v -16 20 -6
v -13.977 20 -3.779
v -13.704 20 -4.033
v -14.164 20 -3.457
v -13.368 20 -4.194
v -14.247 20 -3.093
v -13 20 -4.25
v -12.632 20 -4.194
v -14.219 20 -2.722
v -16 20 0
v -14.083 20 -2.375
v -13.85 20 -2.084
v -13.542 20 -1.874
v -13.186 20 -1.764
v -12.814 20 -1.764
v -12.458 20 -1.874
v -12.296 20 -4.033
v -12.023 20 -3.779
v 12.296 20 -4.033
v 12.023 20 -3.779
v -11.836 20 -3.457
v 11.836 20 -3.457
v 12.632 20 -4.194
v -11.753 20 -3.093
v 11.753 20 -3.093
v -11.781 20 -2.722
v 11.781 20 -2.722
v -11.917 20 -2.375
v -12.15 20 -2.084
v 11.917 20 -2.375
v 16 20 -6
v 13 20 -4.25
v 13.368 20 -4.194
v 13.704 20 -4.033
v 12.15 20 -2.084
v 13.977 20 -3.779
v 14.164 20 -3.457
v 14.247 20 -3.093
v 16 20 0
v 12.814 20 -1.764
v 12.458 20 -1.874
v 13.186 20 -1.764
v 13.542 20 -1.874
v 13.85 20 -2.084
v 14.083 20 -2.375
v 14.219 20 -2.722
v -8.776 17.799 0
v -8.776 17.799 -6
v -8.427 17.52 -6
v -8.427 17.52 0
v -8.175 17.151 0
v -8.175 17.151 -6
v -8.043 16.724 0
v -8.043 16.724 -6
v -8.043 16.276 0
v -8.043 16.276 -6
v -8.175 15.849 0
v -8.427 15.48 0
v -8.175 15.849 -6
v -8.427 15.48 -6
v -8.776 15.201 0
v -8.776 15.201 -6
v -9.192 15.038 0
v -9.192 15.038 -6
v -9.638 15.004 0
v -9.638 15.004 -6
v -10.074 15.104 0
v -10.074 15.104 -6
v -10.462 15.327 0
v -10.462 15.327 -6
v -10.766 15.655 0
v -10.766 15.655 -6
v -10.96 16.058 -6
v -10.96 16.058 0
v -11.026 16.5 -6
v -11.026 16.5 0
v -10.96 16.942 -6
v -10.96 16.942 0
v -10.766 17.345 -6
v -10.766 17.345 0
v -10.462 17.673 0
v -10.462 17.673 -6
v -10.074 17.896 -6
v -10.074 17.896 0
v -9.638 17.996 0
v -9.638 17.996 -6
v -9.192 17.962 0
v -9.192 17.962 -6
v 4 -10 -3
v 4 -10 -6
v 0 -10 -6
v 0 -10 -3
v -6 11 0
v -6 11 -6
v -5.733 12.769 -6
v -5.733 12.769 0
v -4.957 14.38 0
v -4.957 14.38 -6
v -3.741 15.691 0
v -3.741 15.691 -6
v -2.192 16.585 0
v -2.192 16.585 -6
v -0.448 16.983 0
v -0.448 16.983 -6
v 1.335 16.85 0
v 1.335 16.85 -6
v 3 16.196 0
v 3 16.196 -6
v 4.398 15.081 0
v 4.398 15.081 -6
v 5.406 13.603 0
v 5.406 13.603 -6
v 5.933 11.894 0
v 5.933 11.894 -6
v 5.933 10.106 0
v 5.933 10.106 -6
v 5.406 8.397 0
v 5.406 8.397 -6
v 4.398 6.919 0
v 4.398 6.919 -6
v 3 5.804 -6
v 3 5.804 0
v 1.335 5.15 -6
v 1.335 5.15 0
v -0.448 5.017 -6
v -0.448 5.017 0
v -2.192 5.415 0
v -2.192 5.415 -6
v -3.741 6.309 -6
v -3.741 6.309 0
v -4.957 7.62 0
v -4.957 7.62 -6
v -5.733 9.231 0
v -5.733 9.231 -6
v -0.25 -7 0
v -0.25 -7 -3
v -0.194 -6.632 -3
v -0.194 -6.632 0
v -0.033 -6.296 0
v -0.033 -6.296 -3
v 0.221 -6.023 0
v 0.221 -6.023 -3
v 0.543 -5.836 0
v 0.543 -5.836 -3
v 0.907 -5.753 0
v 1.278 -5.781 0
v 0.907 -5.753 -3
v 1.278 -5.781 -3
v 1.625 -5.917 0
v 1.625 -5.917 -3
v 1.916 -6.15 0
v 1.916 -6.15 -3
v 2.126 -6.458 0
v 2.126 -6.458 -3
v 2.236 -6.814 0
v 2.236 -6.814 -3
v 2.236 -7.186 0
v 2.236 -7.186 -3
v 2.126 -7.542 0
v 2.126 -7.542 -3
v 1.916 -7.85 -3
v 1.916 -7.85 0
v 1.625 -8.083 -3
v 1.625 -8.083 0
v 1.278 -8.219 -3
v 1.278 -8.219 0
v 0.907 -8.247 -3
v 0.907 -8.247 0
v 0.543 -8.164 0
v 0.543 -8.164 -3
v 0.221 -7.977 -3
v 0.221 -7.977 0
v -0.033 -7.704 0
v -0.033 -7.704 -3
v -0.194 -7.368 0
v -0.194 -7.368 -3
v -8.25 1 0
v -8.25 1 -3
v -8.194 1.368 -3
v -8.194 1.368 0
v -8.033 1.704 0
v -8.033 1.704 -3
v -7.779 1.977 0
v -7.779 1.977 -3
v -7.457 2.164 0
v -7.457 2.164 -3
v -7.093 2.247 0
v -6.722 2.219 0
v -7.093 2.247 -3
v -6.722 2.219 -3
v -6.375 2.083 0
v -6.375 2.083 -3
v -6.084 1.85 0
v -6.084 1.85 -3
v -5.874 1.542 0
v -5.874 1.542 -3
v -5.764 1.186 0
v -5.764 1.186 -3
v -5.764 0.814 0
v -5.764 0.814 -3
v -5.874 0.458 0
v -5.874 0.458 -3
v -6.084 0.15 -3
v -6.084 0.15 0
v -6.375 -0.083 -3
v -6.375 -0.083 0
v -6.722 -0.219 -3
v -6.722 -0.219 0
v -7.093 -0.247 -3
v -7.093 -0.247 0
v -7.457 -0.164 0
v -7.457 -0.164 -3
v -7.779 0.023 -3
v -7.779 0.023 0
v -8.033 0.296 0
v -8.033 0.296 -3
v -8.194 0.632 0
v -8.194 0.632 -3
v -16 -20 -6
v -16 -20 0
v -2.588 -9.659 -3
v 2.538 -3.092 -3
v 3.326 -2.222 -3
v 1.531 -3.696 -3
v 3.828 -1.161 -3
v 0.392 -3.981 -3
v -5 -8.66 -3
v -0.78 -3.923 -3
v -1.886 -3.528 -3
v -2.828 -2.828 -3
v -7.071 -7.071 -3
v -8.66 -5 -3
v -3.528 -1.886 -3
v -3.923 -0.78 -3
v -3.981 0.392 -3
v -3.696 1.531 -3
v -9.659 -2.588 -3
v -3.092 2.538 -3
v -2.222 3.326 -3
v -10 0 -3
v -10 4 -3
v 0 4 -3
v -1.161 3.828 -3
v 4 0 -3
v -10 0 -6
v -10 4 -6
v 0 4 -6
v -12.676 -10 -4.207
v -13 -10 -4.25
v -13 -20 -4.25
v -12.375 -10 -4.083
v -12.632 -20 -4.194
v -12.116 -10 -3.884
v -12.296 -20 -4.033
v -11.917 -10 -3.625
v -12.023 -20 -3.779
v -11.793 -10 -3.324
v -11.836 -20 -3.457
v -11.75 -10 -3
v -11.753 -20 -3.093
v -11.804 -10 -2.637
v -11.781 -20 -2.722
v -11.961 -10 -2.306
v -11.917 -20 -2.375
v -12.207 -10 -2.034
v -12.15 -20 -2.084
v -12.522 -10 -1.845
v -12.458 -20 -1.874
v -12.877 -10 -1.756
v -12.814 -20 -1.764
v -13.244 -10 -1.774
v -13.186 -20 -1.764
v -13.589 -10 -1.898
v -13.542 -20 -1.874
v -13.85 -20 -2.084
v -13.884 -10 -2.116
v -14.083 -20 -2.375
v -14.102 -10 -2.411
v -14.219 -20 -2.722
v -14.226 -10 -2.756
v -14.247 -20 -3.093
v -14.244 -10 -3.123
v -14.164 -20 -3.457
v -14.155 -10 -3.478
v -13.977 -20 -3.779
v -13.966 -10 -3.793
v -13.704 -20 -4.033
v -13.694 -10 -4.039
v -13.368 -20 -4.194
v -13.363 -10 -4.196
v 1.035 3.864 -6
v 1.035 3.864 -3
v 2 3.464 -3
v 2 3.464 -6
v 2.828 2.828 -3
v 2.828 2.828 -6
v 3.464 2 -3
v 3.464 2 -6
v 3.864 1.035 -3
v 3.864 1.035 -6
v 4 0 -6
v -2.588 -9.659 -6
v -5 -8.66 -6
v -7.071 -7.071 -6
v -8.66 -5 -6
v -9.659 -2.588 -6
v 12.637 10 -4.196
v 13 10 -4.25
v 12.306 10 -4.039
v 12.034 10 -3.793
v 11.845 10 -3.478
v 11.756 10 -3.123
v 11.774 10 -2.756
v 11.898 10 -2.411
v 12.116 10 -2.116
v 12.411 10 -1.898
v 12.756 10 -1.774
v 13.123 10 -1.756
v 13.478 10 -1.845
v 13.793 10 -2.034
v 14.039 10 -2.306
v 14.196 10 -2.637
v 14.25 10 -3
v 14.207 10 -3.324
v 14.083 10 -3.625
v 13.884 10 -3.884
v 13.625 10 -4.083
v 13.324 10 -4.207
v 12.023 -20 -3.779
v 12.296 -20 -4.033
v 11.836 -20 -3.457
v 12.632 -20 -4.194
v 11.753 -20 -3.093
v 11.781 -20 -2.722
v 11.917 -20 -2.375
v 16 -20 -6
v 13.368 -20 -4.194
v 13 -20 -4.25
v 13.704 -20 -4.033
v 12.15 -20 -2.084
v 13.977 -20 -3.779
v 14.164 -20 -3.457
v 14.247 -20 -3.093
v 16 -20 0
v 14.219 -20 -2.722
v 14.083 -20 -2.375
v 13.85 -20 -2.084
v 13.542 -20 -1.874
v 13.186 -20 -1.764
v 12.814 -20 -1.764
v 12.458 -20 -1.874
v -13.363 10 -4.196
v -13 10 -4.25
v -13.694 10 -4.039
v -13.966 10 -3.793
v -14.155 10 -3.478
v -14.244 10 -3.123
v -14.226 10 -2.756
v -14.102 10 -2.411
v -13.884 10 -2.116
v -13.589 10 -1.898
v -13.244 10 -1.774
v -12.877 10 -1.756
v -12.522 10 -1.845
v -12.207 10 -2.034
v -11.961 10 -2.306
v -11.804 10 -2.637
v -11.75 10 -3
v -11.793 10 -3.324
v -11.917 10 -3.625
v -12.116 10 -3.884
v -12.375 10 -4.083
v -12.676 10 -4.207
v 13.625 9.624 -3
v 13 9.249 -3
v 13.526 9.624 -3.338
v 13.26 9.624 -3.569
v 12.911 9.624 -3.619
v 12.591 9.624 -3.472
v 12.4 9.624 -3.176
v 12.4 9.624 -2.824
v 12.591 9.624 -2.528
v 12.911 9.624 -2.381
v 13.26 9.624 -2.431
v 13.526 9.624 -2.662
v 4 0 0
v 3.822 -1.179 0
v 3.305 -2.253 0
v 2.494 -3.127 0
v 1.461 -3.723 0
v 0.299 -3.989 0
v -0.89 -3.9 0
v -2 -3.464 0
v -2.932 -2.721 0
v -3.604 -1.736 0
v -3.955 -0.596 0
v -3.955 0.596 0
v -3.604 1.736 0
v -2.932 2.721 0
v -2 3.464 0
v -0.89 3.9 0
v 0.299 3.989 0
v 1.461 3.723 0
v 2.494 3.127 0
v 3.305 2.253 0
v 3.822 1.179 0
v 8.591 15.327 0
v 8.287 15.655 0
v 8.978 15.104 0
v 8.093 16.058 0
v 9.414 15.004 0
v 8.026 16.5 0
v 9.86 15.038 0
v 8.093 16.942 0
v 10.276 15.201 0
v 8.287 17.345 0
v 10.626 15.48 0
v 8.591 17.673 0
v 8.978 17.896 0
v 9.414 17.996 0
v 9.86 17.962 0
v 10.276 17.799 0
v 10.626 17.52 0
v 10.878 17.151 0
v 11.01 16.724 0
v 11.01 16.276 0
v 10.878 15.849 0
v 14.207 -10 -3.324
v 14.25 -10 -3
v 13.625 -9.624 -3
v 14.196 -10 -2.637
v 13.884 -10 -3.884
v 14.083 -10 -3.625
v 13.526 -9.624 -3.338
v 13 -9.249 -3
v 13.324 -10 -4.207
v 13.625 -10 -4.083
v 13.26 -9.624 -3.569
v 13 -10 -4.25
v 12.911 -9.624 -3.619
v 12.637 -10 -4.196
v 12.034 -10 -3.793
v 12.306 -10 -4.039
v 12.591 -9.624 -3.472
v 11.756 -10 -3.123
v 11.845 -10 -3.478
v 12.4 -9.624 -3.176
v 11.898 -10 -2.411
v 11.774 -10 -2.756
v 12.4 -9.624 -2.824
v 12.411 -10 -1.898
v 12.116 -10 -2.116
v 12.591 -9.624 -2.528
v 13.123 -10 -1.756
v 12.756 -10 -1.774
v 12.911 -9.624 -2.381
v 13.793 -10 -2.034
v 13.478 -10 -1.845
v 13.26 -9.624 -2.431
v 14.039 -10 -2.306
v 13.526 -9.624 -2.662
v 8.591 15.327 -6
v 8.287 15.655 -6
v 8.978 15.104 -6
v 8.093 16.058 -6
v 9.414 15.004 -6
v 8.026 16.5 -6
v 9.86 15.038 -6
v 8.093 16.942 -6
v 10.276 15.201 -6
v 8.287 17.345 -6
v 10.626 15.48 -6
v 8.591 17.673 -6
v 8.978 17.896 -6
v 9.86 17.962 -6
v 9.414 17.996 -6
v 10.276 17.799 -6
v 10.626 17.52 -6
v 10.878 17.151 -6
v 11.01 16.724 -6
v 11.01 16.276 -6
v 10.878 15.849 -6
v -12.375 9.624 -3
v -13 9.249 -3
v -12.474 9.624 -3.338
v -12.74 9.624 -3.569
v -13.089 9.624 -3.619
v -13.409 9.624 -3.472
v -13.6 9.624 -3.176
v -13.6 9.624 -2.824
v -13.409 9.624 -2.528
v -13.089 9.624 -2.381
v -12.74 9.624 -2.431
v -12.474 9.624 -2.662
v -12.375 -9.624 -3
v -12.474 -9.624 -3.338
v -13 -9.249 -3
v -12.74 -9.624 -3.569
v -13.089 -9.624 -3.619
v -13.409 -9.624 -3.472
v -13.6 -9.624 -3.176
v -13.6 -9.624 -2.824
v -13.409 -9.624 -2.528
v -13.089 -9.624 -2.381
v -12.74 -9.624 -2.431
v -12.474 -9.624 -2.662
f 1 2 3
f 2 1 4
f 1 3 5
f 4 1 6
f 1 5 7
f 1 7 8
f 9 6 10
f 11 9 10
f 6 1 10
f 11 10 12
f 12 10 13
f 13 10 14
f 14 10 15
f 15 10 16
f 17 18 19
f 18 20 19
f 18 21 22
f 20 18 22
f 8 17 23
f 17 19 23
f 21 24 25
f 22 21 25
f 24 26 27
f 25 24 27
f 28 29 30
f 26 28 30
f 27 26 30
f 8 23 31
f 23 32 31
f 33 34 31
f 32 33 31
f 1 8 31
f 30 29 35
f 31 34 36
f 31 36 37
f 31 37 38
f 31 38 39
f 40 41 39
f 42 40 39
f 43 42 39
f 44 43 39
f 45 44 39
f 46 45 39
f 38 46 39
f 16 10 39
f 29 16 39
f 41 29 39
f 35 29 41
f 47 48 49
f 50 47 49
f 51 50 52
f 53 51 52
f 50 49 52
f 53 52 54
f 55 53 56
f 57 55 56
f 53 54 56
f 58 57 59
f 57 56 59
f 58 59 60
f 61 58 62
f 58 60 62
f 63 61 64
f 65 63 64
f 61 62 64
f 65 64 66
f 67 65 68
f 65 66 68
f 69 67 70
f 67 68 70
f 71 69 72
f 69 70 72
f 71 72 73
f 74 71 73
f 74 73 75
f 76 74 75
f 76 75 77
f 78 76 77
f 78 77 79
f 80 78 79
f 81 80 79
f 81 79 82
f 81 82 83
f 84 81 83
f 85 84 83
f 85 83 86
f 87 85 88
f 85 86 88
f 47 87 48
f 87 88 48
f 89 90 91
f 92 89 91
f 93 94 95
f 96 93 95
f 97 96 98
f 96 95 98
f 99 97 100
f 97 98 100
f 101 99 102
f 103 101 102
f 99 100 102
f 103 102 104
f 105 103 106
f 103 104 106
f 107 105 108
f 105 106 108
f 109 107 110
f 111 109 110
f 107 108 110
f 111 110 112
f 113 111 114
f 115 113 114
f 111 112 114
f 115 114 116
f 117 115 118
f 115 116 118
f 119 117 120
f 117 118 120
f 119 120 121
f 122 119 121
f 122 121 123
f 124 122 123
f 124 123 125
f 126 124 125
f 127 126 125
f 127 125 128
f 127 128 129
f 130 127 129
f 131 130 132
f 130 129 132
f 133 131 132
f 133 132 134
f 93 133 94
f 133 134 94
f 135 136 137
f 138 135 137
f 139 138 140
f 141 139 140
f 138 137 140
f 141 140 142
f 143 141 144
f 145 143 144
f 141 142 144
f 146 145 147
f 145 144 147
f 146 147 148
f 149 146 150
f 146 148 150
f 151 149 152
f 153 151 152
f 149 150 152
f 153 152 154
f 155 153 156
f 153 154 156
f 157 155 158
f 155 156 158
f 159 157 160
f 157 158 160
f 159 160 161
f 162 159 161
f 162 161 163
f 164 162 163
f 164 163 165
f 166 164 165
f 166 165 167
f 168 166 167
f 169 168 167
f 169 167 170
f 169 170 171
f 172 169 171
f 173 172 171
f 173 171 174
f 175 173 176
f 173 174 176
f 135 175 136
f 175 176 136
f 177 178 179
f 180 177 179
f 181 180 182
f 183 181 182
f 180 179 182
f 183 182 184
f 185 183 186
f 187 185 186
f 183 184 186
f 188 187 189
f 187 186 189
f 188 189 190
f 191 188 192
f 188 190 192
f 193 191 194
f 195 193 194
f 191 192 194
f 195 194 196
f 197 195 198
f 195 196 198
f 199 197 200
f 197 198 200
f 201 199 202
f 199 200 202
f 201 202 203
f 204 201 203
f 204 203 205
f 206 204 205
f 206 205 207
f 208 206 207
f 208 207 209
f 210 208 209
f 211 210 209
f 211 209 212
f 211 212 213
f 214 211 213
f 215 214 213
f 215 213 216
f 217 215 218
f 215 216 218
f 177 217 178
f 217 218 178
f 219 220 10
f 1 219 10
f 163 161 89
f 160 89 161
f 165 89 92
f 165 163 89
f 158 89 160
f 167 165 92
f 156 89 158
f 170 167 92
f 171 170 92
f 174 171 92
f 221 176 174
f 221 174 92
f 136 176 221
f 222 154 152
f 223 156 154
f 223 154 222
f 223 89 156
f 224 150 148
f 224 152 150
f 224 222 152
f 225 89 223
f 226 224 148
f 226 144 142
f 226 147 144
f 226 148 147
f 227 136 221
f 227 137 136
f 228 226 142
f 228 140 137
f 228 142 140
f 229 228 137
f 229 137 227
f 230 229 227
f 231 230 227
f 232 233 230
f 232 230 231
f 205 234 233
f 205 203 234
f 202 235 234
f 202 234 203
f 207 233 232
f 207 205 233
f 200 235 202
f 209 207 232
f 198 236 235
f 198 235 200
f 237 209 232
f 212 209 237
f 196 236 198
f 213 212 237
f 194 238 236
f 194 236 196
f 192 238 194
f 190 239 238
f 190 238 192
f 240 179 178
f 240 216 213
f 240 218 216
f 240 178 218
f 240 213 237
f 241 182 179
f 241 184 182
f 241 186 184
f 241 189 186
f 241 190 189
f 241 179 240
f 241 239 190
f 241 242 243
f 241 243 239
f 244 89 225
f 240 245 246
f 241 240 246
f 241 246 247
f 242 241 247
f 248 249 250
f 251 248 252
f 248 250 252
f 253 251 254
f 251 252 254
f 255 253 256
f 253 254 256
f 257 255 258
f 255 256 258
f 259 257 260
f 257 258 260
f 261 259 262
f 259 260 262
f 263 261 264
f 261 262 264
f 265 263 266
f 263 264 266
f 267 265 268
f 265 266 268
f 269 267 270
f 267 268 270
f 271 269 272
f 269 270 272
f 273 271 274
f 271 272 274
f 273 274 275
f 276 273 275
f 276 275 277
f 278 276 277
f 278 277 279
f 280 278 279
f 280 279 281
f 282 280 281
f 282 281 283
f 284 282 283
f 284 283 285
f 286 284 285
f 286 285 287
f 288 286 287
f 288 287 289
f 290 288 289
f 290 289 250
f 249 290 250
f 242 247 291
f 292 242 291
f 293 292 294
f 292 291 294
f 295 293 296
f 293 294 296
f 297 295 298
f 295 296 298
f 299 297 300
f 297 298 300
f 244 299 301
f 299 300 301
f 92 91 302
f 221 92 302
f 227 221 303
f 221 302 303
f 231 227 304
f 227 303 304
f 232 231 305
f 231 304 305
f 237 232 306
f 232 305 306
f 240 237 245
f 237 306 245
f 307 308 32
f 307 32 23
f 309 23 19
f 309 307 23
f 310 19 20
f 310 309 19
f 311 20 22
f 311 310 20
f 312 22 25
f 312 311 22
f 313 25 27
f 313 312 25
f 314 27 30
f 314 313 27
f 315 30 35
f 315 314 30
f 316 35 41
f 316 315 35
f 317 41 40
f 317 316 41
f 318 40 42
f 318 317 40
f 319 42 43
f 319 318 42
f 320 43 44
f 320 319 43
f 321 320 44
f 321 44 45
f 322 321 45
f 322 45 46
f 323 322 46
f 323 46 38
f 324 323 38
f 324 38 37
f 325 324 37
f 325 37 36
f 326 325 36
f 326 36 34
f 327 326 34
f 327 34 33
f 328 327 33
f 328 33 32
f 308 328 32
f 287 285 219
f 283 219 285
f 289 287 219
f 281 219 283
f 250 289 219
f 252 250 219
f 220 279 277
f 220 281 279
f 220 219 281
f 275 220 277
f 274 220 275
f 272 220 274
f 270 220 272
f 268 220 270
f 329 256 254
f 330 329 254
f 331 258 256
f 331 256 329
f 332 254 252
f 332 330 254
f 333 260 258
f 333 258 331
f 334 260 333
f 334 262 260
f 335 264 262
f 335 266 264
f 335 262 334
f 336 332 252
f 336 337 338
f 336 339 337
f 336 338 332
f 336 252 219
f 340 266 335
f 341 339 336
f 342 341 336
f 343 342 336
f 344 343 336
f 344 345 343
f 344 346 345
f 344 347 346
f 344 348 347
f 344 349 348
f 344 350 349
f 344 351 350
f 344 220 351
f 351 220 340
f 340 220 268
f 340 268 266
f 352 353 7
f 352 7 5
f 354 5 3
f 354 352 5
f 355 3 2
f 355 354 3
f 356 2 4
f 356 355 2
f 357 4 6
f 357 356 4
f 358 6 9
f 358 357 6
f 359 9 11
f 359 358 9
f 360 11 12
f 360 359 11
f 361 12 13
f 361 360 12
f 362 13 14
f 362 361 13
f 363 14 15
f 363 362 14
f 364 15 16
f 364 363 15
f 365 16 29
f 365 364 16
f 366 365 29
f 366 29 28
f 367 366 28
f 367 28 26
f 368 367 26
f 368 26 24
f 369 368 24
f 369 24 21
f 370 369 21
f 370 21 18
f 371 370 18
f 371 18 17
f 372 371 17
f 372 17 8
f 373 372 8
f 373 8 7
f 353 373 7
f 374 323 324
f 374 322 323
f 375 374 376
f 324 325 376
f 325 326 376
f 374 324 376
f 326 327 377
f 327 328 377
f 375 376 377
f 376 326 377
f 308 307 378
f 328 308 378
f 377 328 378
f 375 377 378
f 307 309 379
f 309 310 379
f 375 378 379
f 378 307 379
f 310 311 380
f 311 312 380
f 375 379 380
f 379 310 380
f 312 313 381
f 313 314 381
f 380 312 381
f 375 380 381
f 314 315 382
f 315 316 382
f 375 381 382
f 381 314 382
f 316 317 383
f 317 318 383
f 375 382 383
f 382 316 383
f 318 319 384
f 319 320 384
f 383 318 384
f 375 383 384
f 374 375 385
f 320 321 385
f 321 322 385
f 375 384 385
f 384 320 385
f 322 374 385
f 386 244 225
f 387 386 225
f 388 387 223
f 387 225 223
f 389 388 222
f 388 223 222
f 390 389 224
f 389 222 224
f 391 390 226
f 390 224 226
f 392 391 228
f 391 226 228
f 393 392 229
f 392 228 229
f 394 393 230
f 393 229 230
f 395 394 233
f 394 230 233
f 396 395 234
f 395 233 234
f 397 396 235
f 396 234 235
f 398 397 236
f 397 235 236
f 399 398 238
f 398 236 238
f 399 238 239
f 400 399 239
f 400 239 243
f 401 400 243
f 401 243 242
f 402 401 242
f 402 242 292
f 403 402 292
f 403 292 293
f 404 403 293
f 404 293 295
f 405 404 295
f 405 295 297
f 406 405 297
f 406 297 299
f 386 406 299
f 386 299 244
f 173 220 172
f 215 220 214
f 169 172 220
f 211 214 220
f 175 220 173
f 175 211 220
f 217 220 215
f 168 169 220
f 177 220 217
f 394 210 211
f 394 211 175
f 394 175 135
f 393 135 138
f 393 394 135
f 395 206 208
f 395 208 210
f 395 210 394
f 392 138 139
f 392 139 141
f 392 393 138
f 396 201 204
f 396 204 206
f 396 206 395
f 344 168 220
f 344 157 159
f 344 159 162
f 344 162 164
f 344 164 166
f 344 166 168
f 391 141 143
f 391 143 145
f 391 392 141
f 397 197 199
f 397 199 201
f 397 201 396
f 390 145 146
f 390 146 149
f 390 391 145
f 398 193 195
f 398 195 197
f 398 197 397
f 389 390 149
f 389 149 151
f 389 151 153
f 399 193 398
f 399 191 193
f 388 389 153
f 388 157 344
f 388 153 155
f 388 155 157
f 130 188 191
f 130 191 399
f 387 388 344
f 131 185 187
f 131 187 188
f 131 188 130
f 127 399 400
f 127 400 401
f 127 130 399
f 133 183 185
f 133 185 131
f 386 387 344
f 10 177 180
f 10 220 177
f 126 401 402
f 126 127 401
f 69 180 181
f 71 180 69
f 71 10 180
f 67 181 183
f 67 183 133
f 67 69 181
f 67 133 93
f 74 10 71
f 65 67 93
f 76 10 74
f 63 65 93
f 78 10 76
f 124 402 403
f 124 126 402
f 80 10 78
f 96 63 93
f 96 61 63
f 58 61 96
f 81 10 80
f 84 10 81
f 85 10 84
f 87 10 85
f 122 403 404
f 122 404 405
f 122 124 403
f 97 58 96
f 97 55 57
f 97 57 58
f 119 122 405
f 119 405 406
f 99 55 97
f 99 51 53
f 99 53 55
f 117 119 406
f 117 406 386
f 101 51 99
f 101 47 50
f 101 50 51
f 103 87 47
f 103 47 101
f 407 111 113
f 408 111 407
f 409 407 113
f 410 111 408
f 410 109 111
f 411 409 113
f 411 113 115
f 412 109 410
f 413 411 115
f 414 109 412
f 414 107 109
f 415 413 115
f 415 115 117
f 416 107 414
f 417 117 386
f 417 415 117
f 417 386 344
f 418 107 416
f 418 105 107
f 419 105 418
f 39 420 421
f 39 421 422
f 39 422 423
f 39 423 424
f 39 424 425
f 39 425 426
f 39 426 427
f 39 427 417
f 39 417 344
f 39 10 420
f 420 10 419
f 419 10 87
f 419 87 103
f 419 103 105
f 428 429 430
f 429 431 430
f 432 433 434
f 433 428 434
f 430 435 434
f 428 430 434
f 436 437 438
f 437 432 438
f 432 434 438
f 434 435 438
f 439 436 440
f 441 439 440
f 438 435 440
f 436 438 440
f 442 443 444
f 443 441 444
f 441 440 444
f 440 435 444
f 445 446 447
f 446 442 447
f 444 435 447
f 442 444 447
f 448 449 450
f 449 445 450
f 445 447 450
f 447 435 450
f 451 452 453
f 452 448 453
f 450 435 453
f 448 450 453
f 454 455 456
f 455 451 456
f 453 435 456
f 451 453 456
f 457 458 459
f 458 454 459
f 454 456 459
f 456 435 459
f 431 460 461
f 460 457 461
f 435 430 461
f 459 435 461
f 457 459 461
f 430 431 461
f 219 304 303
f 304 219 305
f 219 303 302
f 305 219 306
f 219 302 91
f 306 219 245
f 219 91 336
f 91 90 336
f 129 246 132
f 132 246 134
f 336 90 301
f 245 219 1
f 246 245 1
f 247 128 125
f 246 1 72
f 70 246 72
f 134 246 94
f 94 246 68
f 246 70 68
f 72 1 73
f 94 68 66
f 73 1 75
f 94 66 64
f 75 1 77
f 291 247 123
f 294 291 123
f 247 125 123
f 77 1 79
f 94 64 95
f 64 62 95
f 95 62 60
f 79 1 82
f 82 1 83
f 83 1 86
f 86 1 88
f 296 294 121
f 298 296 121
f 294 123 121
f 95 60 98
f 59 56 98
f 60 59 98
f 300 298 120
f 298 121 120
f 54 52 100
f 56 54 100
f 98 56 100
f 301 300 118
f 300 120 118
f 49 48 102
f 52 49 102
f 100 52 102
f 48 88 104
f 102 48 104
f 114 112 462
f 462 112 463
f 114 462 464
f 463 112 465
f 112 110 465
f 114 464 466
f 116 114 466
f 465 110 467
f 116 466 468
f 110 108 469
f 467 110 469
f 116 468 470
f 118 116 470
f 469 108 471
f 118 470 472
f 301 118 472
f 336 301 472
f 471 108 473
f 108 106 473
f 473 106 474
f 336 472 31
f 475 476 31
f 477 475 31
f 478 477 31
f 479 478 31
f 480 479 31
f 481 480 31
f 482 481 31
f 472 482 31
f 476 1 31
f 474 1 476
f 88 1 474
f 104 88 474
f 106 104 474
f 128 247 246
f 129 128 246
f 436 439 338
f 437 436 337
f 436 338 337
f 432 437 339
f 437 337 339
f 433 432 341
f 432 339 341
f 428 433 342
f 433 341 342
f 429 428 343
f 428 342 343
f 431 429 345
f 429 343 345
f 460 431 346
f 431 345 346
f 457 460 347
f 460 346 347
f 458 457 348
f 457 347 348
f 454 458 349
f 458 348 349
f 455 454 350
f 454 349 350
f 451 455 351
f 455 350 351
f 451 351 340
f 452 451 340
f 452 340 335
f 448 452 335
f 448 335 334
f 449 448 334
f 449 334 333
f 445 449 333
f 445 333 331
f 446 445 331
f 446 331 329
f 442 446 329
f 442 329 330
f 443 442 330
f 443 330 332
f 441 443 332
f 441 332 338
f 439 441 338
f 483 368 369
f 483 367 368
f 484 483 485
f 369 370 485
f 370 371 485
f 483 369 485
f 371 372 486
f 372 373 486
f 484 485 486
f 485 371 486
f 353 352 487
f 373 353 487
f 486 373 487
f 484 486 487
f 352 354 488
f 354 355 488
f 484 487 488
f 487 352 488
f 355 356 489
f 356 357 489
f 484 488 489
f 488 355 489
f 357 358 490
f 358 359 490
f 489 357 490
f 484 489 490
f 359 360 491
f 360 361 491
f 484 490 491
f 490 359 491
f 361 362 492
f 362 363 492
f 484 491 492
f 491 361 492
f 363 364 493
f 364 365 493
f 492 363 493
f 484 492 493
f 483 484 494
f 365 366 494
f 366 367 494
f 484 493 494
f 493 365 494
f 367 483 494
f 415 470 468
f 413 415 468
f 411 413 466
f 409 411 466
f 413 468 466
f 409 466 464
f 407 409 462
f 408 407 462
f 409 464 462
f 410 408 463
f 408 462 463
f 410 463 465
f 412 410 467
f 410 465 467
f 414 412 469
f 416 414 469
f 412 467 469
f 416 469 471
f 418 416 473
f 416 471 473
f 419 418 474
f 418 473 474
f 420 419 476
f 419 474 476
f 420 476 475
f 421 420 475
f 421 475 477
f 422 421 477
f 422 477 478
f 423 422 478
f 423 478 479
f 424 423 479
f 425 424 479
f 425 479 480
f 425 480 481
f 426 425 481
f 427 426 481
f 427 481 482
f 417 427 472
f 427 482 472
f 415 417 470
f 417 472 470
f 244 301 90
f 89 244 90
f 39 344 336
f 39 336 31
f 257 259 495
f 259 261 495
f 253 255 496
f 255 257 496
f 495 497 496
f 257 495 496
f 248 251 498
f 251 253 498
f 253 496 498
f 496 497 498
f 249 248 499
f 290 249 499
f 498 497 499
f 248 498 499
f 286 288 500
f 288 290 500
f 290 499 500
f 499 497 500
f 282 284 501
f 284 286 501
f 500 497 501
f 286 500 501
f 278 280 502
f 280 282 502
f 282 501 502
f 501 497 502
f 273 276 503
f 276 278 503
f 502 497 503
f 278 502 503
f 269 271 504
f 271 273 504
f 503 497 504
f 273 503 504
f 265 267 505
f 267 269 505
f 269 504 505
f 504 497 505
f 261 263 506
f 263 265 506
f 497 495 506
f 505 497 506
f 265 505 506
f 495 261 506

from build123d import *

# Parameters (mm, degrees)
SKETCH1_W           = 32
SKETCH1_H           = 40
EXTRUDE1_DEPTH      = 6
SKETCH8_R           = 6
CUT_EXTRUDE6_DEPTH  = 6
SKETCH5_R           = 1.5
CUT_EXTRUDE4_DEPTH  = 6
CIRPATTERN1_COUNT   = 3
CUT_EXTRUDE13_DEPTH = 3
SKETCH20_R          = 4
CUT_EXTRUDE14_DEPTH = 3
SKETCH25_R          = 1.25
EXTRUDE4_DEPTH      = 3
SKETCH29_R          = 1.25
EXTRUDE7_DEPTH      = 10
EXTRUDE13_START     = -10
SKETCH27_R          = 1.25
EXTRUDE13_DEPTH     = 10


# Read off the part's stored shape, not the designer's step: M3 Tapped Hole2
with BuildPart() as part:
    # Sketch1 → Extrude1 (new body)
    with BuildSketch(Plane.XY):
        Rectangle(SKETCH1_W, SKETCH1_H)
    extrude(amount=-EXTRUDE1_DEPTH)

    # Sketch8 → Cut-Extrude6 (cut)
    with BuildSketch(Plane(origin=(0, 0, -6), x_dir=(-1, 0, 0), z_dir=(0, 0, -1))):
        with Locations((0, 11)):
            Circle(SKETCH8_R)
    extrude(amount=-CUT_EXTRUDE6_DEPTH, mode=Mode.SUBTRACT)

    # Sketch5 → Cut-Extrude4 (cut)
    with BuildSketch(Plane(origin=(0, 0, -6), x_dir=(-1, 0, 0), z_dir=(0, 0, -1))):
        Circle(SKETCH5_R)
    cut_extrude4 = extrude(amount=-CUT_EXTRUDE4_DEPTH, mode=Mode.SUBTRACT)

    # CirPattern1: Cut-Extrude4 ×3 about axis
    cirpattern1_axis = Axis((0, 11, 0), (0, 0, 1))
    for i in range(1, CIRPATTERN1_COUNT):
        add(cut_extrude4.rotate(cirpattern1_axis, i * 360 / CIRPATTERN1_COUNT), mode=Mode.SUBTRACT)

    # Sketch19 → Cut-Extrude13 (cut)
    with BuildSketch(Plane(origin=(0, 0, -6), x_dir=(-1, 0, 0), z_dir=(0, 0, -1))):
        with BuildLine():
            Line((10, 4), (0, 4))
            ThreePointArc((0, 4), (-2.828427125, 2.828427125), (-4, 0))
            Line((-4, 0), (-4, -10))
            Line((-4, -10), (0, -10))
            ThreePointArc((0, -10), (7.071067812, -7.071067812), (10, 0))
            Line((10, 0), (10, 4))
        make_face()
    extrude(amount=-CUT_EXTRUDE13_DEPTH, mode=Mode.SUBTRACT)

    # Sketch20 → Cut-Extrude14 (cut)
    with BuildSketch(Plane(origin=(0, 0, -3), x_dir=(-1, 0, 0), z_dir=(0, 0, -1))):
        with Locations(Location((0, 0, 0), (0, 0, 180))):
            Circle(SKETCH20_R)
    extrude(amount=-CUT_EXTRUDE14_DEPTH, mode=Mode.SUBTRACT)

    # Sketch25 → Extrude4 (cut)
    with BuildSketch(Plane(origin=(0, 0, -3), x_dir=(-1, 0, 0), z_dir=(0, 0, -1))):
        with Locations((-1, -7)):
            Circle(SKETCH25_R)
        with Locations((7, 1)):
            Circle(SKETCH25_R)
    extrude(amount=-EXTRUDE4_DEPTH, mode=Mode.SUBTRACT)

    # Sketch29 → Extrude7 (cut)
    with BuildSketch(Plane.XZ.offset(20)):
        with Locations(Location((-13, -3, 0), (0, 0, 270))):
            Circle(SKETCH29_R)
        with Locations(Location((13, -3, 0), (0, 0, 270))):
            Circle(SKETCH29_R)
    extrude(amount=-EXTRUDE7_DEPTH, mode=Mode.SUBTRACT)

    # Sketch27 → Extrude13 (cut)
    with BuildSketch(Plane(origin=(0, 20, 0), x_dir=(1, 0, 0), z_dir=(0, 1, 0)).offset(EXTRUDE13_START)):
        with Locations(Location((-13, 3, 0), (0, 0, 90))):
            Circle(SKETCH27_R)
        with Locations(Location((13, 3, 0), (0, 0, 90))):
            Circle(SKETCH27_R)
    extrude(amount=EXTRUDE13_DEPTH, mode=Mode.SUBTRACT)

    # M3 Tapped Hole2 outline → M3 Tapped Hole2 (revolve, cut)
    with BuildSketch(Plane(origin=(13, 0, -3), x_dir=(1, 0, 0), z_dir=(0, 0, 1))):
        Polygon((1.25, -10), (0, -9.248924226), (0, -10), align=None)
        Polygon((0, 10), (0, 9.248924226), (1.25, 10), align=None)
    revolve(axis=Axis((13, 0, -3), (0, 1, 0)), mode=Mode.SUBTRACT)

    # M3 Tapped Hole2 2 outline → M3 Tapped Hole2 2 (revolve, cut)
    with BuildSketch(Plane(origin=(-13, 0, -3), x_dir=(1, 0, 0), z_dir=(0, 0, 1))):
        Polygon((1.25, -10), (0, -9.248924226), (0, -10), align=None)
        Polygon((0, 10), (0, 9.248924226), (1.25, 10), align=None)
    revolve(axis=Axis((-13, 0, -3), (0, 1, 0)), mode=Mode.SUBTRACT)


solid = part.part
